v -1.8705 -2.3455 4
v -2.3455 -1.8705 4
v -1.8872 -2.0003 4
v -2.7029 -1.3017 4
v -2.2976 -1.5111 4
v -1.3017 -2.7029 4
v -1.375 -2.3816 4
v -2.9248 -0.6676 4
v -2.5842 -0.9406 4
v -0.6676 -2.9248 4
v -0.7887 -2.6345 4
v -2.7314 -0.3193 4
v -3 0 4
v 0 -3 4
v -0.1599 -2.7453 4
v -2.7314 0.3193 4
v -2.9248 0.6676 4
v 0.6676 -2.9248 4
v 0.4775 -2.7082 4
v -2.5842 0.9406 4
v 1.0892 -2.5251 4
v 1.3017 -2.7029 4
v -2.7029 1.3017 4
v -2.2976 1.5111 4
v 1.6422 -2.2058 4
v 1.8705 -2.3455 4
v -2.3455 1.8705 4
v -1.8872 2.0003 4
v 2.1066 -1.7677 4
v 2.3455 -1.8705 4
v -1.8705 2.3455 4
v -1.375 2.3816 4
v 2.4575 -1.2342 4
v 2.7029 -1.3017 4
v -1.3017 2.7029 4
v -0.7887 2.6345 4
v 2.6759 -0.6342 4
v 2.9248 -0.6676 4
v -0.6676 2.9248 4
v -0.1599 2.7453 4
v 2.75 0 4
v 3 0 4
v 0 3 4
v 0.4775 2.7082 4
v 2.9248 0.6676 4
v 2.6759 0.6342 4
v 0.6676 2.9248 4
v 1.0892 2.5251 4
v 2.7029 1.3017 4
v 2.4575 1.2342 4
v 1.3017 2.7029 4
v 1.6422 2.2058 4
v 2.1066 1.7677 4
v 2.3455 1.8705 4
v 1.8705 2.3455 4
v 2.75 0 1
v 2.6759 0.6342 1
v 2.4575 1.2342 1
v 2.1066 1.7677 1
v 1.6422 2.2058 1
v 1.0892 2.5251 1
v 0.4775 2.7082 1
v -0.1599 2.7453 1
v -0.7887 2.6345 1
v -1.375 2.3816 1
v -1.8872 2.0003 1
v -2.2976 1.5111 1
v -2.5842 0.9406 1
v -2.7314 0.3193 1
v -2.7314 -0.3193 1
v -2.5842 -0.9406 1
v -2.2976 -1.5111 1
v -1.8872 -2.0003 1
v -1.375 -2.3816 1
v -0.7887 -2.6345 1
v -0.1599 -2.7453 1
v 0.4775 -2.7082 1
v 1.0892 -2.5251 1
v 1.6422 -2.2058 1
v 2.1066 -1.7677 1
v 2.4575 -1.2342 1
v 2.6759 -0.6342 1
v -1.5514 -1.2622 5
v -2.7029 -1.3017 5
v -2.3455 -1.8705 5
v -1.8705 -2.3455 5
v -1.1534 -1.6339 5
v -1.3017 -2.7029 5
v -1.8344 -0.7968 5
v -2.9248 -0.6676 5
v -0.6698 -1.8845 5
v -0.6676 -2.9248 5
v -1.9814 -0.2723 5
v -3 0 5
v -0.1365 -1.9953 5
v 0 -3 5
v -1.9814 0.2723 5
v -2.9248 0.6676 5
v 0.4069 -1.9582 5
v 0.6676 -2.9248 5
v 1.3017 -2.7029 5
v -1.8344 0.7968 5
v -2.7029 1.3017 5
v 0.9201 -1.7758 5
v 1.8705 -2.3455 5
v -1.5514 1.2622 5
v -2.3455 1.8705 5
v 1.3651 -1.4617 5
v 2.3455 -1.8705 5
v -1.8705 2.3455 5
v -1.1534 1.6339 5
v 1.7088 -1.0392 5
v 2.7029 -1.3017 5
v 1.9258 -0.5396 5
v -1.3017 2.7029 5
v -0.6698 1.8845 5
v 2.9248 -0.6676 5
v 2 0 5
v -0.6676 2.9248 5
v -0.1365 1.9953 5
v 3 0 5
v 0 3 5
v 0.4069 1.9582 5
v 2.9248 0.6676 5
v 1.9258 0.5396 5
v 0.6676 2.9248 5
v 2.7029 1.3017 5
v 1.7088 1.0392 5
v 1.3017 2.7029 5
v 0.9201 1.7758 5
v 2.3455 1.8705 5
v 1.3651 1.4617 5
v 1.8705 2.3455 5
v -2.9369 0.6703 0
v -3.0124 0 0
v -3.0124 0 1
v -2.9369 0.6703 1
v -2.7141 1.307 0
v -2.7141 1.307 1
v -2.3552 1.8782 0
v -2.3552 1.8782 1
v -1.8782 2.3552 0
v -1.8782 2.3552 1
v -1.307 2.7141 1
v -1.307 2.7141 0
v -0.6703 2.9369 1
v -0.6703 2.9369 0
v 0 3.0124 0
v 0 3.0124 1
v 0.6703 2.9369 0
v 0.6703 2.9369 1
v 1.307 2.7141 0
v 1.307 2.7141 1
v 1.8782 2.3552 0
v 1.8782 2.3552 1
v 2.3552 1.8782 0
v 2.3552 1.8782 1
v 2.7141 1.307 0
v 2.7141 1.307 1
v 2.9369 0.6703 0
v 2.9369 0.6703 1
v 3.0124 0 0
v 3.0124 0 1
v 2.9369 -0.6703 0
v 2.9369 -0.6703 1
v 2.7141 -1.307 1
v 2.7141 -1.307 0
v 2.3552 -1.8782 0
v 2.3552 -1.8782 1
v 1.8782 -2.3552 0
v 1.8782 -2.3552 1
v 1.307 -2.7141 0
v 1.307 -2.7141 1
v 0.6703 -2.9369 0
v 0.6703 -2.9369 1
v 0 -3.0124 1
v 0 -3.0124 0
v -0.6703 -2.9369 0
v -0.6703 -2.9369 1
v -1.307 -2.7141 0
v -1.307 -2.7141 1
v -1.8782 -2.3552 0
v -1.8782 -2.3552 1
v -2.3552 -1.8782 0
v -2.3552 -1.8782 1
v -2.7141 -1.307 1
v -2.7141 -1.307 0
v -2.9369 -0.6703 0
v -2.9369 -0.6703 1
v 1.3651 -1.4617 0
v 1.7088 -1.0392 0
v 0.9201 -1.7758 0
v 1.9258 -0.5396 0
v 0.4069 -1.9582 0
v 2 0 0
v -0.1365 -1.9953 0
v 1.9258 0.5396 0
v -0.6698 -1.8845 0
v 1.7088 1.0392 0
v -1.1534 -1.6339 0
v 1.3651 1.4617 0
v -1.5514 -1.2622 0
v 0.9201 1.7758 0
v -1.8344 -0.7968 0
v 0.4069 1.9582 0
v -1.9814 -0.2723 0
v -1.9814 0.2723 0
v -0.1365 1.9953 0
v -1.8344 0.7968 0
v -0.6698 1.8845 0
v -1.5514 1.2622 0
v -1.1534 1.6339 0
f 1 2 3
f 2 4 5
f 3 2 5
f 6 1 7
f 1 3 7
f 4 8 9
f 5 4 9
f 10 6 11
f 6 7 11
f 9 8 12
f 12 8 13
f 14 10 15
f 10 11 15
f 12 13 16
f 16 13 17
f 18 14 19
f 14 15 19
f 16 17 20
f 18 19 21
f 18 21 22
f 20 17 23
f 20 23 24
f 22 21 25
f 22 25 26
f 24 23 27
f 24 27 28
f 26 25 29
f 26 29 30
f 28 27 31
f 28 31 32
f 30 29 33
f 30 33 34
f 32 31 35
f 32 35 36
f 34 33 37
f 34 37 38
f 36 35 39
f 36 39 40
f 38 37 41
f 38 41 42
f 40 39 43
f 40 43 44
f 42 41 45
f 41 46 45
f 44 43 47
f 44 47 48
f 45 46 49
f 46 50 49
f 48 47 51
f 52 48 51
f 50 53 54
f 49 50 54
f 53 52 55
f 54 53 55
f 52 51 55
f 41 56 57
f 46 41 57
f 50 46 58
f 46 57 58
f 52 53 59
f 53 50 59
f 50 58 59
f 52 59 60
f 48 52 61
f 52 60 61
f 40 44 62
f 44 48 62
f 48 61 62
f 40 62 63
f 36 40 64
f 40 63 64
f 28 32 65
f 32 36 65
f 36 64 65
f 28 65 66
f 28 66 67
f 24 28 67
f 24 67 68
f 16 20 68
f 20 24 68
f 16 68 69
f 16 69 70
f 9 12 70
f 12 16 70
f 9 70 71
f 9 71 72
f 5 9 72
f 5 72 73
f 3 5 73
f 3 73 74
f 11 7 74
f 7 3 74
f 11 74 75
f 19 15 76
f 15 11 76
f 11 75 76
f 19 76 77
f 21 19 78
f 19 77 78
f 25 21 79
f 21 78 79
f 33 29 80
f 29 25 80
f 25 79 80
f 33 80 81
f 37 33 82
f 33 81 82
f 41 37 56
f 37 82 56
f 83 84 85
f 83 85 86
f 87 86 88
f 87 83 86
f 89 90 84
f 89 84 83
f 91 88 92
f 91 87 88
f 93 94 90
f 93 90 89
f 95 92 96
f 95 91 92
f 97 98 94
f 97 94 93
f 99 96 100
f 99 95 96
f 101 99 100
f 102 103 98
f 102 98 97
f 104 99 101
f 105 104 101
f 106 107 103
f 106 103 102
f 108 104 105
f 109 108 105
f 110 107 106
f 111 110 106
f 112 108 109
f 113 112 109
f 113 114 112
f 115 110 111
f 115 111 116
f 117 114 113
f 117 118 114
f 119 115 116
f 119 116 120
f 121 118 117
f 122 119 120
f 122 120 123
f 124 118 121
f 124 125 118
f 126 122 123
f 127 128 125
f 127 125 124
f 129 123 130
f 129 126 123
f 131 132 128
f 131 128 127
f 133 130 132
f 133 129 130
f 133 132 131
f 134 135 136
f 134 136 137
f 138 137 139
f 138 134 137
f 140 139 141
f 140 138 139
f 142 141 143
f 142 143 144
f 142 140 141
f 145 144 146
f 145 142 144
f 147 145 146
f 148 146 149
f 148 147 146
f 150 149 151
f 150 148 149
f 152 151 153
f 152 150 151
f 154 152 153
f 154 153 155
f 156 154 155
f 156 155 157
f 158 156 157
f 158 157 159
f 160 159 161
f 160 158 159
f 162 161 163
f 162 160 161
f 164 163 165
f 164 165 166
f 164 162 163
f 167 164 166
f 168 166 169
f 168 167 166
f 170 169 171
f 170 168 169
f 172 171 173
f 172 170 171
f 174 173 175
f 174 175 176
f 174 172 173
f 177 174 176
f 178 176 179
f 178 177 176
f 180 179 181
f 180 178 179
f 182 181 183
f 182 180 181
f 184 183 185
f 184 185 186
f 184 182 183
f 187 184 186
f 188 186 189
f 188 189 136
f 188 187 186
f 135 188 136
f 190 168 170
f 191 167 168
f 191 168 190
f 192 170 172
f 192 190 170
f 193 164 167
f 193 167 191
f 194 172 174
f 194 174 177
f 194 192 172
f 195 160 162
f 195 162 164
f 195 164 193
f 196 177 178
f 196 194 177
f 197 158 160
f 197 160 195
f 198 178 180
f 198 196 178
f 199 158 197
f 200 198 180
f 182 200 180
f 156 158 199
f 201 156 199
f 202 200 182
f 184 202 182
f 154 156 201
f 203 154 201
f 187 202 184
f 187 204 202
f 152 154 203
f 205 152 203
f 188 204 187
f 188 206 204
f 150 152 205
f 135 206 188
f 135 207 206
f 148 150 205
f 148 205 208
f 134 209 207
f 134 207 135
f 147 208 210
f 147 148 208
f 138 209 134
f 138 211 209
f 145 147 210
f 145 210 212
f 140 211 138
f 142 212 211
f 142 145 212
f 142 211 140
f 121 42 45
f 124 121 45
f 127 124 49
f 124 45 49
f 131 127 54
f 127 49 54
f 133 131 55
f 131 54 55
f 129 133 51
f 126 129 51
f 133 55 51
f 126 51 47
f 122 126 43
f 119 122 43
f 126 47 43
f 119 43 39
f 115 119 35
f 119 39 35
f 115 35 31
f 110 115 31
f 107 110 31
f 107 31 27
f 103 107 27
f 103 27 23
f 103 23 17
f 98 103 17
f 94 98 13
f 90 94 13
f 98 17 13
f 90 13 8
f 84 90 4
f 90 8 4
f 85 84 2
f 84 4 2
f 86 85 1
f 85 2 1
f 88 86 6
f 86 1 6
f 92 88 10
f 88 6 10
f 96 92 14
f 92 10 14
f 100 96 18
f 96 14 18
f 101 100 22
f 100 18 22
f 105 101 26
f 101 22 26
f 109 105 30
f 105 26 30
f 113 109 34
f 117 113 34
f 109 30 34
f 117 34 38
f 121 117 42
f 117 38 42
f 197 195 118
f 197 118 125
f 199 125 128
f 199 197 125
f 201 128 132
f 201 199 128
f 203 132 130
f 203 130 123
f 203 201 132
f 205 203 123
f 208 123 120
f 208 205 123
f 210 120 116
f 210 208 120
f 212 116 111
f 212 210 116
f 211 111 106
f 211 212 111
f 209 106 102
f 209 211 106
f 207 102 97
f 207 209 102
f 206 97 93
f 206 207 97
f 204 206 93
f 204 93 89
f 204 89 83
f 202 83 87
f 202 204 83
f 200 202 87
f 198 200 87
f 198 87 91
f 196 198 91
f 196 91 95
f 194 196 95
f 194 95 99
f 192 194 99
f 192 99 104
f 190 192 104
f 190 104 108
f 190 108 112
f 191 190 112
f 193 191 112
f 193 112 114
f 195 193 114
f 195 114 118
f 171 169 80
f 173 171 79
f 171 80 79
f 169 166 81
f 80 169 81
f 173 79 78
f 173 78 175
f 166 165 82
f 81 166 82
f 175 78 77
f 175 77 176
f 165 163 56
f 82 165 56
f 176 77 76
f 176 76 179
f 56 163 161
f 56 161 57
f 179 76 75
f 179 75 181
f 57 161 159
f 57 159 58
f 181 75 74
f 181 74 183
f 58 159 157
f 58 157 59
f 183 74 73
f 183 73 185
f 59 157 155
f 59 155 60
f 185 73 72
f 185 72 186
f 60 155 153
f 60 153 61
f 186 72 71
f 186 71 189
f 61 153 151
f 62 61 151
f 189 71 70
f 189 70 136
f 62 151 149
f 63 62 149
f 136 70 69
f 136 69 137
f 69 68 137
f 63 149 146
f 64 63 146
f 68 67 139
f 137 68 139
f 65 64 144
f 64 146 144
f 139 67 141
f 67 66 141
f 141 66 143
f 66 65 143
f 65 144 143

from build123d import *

# Parameters (mm, degrees)
SKETCH_1_R      = 2.75
SKETCH_1_R_2    = 2
EXTRUDE_1_DEPTH = 5
EXTRUDE_START   = -1
SKETCH_2_R      = 3
SKETCH_2_R_2    = 2
EXTRUDE_2_DEPTH = 1
SKETCH_3_R      = 3.012416382
SKETCH_3_R_2    = 2
EXTRUDE_3_DEPTH = 1


with BuildPart() as part:
    # 草图1 → 凸台-拉伸1 (new body)
    with BuildSketch(Plane.XY):
        Circle(SKETCH_1_R)
        Circle(SKETCH_1_R_2, mode=Mode.SUBTRACT)
    extrude(amount=EXTRUDE_1_DEPTH)

    # 草图2 → 凸台-拉伸2 (add)
    with BuildSketch(Plane.XY.offset(5).offset(EXTRUDE_START)):
        Circle(SKETCH_2_R)
        Circle(SKETCH_2_R_2, mode=Mode.SUBTRACT)
    extrude(amount=EXTRUDE_2_DEPTH)

    # 草图3 → 凸台-拉伸3 (add)
    with BuildSketch(Plane(origin=(0, 0, 0), x_dir=(-1, 0, 0), z_dir=(0, 0, -1))):
        Circle(SKETCH_3_R)
        with Locations(Location((0, 0, 0), (0, 0, 180))):
            Circle(SKETCH_3_R_2, mode=Mode.SUBTRACT)
    extrude(amount=-EXTRUDE_3_DEPTH)


solid = part.part
